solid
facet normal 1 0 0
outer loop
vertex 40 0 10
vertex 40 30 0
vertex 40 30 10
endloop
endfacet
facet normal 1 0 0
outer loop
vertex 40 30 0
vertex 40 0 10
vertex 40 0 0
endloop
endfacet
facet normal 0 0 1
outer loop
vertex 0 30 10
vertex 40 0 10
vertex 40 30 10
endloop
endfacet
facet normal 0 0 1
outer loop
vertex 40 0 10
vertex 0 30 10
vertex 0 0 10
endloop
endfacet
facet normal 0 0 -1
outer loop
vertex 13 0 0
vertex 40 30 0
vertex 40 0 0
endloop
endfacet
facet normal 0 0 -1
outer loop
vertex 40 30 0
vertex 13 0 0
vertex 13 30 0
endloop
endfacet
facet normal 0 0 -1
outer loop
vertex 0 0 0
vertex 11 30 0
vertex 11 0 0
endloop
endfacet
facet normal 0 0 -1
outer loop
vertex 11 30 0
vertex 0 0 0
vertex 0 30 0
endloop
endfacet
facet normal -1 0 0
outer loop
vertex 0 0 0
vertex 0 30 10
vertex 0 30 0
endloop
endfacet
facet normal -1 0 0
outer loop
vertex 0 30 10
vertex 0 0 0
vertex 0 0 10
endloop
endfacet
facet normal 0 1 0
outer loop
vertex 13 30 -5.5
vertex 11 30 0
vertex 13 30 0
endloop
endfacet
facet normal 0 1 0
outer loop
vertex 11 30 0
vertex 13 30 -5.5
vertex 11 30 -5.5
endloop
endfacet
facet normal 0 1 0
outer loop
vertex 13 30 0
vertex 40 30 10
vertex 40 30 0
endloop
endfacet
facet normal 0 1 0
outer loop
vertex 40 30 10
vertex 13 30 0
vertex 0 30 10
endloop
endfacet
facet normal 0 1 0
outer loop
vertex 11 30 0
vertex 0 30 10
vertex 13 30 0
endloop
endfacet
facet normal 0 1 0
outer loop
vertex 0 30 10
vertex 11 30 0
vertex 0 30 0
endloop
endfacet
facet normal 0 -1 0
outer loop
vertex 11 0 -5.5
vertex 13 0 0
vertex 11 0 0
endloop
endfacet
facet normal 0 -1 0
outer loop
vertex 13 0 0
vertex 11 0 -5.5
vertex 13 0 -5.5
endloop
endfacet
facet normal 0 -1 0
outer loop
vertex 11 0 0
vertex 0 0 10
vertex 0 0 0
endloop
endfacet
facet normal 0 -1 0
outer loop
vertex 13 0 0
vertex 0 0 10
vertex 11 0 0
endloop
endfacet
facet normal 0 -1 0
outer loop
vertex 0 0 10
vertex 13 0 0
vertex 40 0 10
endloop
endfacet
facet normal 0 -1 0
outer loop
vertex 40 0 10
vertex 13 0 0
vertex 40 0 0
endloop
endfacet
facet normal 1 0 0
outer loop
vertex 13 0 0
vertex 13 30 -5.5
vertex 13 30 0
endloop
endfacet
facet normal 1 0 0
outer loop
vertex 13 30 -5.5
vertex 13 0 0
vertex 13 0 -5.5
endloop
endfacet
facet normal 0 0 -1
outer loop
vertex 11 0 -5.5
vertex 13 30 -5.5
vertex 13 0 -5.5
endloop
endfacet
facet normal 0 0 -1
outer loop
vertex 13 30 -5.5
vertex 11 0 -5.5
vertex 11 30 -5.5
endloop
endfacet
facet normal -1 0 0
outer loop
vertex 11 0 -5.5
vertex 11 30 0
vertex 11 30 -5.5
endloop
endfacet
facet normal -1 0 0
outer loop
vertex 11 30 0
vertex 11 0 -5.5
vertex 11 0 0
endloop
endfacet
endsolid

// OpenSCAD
// units=mm — generated by scad_emitter.py
// part=unnamed
$fn = 48;

union() { cube([40, 30, 10]); translate([11, 0, -5.5]) cube([2, 30, 6.5]); }
